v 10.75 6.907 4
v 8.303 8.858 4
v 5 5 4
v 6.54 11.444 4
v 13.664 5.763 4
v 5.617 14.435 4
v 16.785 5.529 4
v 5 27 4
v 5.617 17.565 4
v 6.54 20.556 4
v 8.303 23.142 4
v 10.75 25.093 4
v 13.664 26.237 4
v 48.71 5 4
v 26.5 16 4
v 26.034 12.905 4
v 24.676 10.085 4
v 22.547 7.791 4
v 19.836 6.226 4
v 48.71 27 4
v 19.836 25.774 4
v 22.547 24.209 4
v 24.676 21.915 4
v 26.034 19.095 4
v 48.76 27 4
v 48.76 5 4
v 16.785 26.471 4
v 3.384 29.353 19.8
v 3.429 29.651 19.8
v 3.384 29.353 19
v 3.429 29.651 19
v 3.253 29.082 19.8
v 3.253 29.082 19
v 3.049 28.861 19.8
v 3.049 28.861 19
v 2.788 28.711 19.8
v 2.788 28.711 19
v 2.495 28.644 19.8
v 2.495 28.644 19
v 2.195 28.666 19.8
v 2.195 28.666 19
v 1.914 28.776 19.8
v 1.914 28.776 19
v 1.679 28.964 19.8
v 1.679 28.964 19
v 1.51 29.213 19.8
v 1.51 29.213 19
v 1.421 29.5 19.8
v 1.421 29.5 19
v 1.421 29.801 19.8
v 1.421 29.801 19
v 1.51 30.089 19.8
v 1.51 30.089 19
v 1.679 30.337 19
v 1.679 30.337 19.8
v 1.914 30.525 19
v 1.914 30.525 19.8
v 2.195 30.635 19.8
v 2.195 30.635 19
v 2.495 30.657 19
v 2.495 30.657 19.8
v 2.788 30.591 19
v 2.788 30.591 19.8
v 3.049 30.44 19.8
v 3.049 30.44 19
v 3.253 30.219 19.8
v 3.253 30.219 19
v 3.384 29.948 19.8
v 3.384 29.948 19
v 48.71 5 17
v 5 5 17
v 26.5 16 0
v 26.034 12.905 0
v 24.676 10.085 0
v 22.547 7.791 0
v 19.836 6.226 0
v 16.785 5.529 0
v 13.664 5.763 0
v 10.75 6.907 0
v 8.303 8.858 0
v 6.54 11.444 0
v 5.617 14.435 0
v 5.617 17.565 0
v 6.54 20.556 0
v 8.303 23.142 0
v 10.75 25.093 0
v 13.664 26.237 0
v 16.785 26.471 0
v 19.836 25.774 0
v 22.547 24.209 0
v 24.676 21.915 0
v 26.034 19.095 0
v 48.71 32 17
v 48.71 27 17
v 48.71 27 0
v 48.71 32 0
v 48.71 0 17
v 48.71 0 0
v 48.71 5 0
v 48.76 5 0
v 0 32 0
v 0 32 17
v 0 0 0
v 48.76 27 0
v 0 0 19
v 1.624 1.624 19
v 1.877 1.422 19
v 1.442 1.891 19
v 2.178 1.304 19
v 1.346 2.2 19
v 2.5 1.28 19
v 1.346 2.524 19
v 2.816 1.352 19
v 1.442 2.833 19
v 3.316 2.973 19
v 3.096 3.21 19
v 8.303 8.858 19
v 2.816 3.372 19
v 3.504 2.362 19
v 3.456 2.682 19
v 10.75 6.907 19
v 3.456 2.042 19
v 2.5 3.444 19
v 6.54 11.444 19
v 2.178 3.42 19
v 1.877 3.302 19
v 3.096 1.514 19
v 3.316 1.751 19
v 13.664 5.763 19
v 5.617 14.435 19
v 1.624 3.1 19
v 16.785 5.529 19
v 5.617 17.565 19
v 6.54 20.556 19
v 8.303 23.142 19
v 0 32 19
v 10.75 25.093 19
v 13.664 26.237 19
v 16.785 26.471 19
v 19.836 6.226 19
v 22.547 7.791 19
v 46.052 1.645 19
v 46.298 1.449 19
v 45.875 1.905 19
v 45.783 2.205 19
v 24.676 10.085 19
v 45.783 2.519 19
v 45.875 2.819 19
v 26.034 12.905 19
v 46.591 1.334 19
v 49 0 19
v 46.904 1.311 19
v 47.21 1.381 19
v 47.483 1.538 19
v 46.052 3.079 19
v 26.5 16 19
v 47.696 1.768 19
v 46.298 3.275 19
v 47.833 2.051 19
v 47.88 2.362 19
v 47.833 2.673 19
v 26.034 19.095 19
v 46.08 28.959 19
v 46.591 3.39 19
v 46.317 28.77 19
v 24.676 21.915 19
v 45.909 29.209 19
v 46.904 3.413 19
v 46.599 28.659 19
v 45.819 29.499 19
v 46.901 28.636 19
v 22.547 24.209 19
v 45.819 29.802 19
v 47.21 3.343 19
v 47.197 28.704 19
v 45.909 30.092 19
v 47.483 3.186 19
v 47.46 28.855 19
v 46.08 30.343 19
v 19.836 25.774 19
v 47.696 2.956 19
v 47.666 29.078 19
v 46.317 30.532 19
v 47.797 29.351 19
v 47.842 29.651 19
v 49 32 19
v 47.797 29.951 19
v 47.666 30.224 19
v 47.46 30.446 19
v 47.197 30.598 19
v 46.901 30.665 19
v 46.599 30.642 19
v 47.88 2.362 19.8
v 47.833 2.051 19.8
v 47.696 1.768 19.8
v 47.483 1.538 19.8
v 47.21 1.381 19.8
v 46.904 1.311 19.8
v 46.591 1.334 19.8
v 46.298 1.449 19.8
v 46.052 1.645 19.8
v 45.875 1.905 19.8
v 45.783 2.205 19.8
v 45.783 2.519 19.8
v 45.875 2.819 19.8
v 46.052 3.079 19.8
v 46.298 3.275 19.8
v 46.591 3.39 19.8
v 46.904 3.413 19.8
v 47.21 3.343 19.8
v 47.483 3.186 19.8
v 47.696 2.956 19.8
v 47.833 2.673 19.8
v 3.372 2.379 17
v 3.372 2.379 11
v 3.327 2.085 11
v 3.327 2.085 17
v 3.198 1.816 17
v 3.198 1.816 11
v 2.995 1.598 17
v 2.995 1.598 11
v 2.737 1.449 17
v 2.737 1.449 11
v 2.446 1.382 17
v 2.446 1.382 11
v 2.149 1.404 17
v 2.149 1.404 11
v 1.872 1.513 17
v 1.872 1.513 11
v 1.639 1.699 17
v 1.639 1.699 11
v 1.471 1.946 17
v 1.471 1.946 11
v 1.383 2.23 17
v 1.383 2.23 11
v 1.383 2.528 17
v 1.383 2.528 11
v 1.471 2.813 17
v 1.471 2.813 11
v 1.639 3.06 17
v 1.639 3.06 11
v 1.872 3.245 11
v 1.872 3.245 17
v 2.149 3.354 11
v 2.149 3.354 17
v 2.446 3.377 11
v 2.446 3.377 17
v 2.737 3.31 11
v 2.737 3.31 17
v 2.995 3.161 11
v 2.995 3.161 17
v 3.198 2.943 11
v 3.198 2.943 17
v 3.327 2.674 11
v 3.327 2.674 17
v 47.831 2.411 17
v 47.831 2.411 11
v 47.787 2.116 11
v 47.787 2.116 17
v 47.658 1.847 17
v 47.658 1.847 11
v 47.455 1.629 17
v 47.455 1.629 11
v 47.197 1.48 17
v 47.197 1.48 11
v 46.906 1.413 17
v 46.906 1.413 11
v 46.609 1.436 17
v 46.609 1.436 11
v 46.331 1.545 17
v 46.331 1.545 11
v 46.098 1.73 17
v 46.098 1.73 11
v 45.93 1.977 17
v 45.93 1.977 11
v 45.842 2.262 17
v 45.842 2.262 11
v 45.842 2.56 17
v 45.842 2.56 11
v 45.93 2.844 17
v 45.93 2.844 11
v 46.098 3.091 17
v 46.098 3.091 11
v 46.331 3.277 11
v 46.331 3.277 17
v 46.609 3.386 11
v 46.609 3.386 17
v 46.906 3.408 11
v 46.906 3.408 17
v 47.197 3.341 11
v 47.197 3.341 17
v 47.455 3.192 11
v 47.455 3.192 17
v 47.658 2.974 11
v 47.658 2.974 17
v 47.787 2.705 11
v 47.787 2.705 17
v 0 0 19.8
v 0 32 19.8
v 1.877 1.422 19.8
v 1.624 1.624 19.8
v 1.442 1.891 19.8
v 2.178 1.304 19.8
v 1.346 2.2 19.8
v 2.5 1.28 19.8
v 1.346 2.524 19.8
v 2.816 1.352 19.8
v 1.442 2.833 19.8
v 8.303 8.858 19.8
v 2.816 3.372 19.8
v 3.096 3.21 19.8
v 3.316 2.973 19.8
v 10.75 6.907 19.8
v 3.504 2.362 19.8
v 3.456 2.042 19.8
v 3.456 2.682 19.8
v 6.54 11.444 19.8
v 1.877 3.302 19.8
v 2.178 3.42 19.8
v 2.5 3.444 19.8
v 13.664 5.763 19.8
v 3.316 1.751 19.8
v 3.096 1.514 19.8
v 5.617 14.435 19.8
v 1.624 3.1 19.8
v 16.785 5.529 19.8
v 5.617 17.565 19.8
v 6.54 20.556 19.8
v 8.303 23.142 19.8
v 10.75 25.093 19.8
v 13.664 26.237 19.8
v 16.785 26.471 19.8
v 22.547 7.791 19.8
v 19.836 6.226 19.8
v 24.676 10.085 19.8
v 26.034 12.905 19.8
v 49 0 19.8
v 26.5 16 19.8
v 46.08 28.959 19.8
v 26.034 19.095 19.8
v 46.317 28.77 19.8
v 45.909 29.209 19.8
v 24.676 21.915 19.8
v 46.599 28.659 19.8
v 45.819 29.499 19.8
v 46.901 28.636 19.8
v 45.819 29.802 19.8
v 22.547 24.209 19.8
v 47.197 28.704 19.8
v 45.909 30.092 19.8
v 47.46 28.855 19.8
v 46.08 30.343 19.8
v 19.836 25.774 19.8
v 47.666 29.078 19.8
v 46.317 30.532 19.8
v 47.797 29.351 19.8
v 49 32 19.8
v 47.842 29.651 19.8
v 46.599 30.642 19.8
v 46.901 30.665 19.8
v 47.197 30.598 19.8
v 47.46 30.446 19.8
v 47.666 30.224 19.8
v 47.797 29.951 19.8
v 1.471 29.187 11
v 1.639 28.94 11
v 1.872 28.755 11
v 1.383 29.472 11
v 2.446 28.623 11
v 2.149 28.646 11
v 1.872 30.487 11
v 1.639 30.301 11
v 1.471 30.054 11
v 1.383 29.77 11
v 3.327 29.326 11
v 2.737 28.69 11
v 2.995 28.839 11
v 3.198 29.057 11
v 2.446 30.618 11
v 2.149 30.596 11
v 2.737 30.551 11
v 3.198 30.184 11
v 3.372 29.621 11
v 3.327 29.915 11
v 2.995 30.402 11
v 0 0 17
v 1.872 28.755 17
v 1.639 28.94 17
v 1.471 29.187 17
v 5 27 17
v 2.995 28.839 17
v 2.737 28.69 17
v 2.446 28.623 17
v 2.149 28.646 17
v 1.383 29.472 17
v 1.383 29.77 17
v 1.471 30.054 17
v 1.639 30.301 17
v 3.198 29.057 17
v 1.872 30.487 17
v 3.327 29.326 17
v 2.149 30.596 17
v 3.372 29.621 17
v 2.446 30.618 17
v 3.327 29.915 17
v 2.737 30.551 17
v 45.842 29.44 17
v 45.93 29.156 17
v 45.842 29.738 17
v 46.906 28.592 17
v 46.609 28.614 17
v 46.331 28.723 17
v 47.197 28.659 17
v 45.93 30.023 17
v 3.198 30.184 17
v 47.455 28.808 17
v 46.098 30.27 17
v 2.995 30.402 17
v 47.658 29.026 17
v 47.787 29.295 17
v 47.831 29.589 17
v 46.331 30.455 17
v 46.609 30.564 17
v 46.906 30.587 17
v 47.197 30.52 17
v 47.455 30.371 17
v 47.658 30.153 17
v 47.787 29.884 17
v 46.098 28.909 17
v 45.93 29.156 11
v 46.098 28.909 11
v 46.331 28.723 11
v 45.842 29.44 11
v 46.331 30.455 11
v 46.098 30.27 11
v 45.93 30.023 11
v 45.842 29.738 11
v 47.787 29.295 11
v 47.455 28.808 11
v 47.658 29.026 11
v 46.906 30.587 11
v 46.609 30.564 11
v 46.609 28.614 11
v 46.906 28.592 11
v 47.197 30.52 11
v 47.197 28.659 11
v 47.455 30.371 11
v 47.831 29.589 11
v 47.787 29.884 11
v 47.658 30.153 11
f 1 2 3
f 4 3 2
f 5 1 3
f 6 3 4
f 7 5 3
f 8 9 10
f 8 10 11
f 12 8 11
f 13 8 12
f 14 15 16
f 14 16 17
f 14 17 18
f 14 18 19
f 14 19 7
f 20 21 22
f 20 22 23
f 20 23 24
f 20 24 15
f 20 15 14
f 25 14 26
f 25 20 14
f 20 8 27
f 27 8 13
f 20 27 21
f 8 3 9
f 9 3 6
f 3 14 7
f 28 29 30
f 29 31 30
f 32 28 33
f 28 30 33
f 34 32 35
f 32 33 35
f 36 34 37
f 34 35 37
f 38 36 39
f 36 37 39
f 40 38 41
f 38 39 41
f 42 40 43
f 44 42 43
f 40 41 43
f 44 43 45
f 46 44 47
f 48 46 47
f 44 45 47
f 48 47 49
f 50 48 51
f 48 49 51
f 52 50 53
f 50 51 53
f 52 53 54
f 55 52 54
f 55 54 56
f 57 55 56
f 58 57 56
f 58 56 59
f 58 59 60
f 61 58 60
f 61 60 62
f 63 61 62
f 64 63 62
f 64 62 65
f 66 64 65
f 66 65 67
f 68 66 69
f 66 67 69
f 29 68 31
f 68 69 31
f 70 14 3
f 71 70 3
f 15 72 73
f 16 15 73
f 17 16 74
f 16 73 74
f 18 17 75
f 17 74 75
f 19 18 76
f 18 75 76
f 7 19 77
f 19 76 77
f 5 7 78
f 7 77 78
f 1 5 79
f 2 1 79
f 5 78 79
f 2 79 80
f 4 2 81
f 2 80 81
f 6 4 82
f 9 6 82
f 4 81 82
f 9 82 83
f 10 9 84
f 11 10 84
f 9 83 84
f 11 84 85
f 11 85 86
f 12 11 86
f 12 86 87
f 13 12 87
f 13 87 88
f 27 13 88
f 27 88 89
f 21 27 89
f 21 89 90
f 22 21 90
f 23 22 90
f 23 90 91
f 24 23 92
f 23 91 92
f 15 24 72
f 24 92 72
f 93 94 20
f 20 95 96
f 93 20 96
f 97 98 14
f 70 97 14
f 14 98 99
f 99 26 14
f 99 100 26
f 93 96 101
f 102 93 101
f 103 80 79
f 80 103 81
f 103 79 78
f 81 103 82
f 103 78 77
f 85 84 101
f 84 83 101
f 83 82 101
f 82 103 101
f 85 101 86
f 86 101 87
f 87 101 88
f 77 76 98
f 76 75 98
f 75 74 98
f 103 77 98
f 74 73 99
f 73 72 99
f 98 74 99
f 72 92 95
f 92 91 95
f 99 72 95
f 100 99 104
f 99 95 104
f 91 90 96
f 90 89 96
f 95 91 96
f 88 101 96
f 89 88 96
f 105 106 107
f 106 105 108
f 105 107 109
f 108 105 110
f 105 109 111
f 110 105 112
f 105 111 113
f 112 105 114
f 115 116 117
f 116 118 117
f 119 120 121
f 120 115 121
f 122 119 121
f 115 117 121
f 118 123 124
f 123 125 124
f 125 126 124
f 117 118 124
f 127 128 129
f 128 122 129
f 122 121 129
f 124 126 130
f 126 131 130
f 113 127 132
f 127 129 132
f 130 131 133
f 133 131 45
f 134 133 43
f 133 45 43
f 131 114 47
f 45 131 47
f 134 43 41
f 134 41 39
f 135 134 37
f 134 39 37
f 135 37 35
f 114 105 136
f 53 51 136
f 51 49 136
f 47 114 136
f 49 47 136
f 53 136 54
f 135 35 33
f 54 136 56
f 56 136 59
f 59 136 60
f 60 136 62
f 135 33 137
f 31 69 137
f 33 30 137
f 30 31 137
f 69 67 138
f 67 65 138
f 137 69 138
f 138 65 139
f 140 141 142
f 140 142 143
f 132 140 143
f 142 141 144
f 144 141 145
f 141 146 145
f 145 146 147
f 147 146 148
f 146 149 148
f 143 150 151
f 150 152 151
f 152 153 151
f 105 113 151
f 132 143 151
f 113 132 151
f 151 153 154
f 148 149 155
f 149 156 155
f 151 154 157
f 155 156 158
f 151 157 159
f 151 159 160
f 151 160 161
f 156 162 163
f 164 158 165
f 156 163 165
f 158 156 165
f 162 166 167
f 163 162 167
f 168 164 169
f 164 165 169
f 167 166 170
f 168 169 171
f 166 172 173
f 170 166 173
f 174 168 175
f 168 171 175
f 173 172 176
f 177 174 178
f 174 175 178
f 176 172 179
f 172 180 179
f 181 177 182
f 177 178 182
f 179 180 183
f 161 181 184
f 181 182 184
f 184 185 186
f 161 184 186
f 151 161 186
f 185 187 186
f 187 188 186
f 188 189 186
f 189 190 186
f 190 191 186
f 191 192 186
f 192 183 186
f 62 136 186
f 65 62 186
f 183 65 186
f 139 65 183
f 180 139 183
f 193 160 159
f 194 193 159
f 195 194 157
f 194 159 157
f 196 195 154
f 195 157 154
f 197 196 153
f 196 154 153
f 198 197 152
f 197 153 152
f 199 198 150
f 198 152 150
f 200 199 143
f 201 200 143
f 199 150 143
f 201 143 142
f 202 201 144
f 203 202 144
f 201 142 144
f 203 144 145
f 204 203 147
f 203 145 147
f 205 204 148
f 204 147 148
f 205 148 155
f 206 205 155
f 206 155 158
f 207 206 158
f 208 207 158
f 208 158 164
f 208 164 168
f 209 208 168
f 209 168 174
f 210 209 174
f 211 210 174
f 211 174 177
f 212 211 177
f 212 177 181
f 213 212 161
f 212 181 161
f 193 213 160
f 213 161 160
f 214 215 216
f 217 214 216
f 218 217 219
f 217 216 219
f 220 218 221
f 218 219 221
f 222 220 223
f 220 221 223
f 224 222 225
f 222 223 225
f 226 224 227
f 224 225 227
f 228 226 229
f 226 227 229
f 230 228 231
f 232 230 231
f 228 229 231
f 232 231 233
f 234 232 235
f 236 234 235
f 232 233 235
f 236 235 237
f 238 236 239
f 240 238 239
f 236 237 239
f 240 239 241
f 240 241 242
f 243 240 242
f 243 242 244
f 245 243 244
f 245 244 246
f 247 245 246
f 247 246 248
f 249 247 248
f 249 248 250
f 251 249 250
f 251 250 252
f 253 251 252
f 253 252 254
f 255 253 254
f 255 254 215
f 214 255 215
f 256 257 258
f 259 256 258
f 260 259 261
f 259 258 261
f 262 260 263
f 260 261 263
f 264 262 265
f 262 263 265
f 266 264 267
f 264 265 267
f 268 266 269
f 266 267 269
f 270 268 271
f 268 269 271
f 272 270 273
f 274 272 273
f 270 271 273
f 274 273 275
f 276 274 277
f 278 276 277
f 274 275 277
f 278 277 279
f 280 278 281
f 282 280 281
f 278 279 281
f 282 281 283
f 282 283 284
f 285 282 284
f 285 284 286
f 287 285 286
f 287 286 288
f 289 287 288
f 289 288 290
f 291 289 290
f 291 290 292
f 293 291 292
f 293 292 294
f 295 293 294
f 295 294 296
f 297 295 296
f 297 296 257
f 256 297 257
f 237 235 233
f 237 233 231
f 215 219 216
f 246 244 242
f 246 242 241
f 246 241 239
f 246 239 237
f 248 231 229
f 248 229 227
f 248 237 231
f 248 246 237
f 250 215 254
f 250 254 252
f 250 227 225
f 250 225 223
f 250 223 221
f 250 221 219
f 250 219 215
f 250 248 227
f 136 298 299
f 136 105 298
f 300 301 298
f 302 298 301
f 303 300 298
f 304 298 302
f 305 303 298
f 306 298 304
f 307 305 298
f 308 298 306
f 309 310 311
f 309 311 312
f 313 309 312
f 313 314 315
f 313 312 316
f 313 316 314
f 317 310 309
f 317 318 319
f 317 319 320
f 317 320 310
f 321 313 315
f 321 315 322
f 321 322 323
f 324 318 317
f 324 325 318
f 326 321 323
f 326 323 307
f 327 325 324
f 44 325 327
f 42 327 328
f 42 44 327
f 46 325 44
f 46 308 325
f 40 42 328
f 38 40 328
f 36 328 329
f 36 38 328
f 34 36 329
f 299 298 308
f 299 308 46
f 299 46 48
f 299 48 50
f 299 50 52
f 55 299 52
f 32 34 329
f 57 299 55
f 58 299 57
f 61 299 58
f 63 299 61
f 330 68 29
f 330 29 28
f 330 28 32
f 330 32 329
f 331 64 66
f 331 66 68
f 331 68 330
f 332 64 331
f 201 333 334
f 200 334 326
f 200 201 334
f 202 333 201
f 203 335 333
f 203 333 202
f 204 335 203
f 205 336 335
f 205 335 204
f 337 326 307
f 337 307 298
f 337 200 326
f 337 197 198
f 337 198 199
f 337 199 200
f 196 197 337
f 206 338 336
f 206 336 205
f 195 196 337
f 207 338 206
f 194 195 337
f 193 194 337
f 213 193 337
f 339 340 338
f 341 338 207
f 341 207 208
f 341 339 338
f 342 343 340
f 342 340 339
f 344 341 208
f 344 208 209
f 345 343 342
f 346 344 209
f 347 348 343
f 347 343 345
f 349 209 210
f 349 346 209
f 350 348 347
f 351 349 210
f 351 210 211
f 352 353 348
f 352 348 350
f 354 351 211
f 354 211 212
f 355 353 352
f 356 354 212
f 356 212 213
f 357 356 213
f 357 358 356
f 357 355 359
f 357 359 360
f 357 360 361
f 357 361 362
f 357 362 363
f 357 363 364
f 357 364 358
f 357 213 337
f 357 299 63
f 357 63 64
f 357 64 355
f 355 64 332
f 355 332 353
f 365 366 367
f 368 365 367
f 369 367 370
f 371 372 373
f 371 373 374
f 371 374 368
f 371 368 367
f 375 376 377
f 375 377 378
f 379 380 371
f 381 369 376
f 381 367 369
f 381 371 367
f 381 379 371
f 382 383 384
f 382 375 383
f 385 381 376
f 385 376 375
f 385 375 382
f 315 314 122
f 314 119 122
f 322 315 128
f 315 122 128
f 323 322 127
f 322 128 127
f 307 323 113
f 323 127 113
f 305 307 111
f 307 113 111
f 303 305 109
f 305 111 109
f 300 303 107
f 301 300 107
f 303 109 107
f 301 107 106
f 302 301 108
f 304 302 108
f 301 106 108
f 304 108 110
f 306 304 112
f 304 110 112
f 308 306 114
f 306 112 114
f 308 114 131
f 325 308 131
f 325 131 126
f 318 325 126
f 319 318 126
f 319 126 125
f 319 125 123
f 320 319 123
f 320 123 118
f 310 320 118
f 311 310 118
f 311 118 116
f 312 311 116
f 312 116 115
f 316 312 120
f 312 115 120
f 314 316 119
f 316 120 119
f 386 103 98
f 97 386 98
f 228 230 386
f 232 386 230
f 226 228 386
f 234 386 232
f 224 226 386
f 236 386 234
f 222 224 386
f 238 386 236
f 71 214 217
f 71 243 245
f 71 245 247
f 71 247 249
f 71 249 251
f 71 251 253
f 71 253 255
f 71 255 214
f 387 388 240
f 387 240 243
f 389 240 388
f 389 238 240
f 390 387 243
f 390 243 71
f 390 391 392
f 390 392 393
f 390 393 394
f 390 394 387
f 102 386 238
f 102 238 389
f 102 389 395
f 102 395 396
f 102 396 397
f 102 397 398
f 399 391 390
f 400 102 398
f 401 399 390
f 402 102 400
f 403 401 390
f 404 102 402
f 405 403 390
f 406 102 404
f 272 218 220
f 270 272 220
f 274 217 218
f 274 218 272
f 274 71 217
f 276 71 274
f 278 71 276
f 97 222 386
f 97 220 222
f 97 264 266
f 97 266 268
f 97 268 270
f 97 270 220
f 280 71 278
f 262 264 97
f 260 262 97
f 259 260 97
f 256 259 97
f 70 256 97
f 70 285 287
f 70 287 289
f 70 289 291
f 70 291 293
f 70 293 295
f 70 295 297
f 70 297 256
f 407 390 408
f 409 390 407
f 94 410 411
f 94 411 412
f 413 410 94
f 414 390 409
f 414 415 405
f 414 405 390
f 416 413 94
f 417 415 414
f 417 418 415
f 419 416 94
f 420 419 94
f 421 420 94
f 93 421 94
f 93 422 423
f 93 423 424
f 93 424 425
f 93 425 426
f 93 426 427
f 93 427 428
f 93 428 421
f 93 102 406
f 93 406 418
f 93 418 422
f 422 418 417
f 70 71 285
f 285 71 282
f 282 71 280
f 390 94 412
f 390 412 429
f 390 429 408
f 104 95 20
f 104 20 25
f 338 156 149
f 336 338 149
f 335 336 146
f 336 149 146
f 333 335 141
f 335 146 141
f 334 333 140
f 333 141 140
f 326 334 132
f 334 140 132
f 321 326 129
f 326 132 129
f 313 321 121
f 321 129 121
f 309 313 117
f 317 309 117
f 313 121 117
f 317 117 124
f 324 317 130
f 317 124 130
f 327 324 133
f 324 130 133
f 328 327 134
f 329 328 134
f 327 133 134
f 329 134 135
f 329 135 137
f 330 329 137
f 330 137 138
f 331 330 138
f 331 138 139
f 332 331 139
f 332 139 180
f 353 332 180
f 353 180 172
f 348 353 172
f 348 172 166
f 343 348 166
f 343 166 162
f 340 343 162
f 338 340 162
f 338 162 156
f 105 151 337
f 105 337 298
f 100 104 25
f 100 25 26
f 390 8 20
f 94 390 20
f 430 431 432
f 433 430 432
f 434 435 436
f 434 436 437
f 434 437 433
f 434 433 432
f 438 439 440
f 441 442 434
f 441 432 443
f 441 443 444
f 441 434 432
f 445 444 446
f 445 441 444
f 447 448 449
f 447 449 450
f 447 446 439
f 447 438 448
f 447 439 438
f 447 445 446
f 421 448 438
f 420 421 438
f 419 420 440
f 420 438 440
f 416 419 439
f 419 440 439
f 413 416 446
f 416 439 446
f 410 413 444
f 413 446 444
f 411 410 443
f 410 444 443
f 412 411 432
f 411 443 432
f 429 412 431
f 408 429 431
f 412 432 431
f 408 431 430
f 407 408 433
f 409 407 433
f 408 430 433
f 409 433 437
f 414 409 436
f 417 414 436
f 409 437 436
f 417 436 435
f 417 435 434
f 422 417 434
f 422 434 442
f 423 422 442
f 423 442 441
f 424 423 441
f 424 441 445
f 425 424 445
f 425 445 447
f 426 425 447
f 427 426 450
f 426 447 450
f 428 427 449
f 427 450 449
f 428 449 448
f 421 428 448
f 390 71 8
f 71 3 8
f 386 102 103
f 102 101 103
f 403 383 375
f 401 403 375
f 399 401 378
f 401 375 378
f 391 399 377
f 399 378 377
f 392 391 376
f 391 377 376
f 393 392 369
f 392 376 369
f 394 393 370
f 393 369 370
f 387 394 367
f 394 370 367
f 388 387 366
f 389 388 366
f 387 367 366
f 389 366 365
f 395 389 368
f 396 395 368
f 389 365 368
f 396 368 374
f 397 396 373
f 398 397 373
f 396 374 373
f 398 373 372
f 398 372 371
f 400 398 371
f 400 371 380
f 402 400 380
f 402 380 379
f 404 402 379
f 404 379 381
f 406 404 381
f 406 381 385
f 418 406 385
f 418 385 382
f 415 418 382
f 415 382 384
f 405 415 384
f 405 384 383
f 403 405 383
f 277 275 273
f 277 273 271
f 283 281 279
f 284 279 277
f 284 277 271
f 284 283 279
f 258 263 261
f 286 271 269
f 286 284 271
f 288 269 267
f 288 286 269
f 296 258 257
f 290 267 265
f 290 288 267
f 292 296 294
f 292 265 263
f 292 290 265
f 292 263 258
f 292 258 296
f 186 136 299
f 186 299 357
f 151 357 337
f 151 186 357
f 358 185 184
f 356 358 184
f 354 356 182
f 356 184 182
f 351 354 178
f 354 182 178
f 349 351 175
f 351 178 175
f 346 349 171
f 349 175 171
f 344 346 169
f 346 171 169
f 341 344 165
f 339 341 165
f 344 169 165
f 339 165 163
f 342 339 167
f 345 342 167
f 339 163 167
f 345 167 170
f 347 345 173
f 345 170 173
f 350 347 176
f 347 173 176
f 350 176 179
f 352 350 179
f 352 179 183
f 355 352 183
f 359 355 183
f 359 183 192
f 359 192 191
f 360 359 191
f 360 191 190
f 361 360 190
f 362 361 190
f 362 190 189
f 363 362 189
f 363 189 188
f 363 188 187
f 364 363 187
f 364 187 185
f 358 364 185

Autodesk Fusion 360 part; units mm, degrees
sketch "Sketch1" plane through (0, 0, 0) normal (0, 0, 1) x (1, 0, 0)
  line L0 (0, 0) -> (48.7101, 0)
  line L1 (48.7101, 0) -> (48.7101, 32)
  line L2 (48.7101, 32) -> (0, 32)
  line L3 (0, 32) -> (0, 0)
  line L4 (5, 27) -> (48.76, 27)
  line L5 (48.76, 27) -> (48.76, 5)
  line L6 (48.76, 5) -> (5, 5)
  line L7 (5, 5) -> (5, 27)
  circle A0 centre (16, 16) radius 10.5
  line L8 (16, 16) -> (16, 27) construction
  line L9 (16, 16) -> (16, 5) construction
  circle A1 centre (2.3717, 29.6206) radius 1
  circle A2 centre (46.8313, 29.5894) radius 1
  line L10 (0, 16) -> (48.76, 16) construction
  circle A3 centre (2.3717, 2.3794) radius 1
  circle A4 centre (46.8313, 2.4106) radius 1
  dimension "d1" = 5
  dimension "d2" = 5
  dimension "d4" = 43.76
  dimension "d6" = 5
  dimension "d7" = 22
  dimension "d8" = 21
  dimension "d9" = 11
  dimension "d14" = 2
  dimension "d15" = 2
extrude "Extrude1" add sketch "Sketch1" along normal blind 17 contours L0 L1 L2 L3 L4 L6 L7 | A1 | A2 | A3 | A4 makes body 1
extrude "Extrude2" add sketch "Sketch1" along normal blind 4 contours L1 L4 L6 L7 | L1 L4 L5 L6 | A0 bodies 1
extrude "Extrude3" cut sketch "Sketch1" along normal blind 15 from surface at 11 contours A1 | A2 | A3 | A4 bodies 1
ref_plane "WorkPlane1" through (0, 0, 19) normal (0, 0, 1) x (1, 0, 0)
sketch "Sketch2" plane through (0, 0, 19) normal (0, 0, 1) x (1, 0, 0)
  line L0 (0, 32) -> (49, 32)
  line L1 (49, 32) -> (49, 0)
  line L2 (49, 0) -> (0, 0)
  line L3 (0, 0) -> (0, 32)
  circle A0 centre (2.4192, 29.6507) radius 1.0096
  circle A1 centre (46.8253, 29.6507) radius 1.0172
  circle A2 centre (2.4192, 2.362) radius 1.0849
  circle A3 centre (46.8253, 2.362) radius 1.0543
extrude "Extrude4" add sketch "Sketch2" along normal blind 0.8 separate body contours L0 L1 L2 L3 | A0 | A1 | A2 | A3 makes body 2
extrude "Extrude5" cut sketch "Sketch2" along normal blind 5 contours A0 | A1 | A2 | A3 bodies 2
extrude "Extrude6" cut sketch "Sketch1" along normal through all and the other way through all contours A0 bodies 1 2
